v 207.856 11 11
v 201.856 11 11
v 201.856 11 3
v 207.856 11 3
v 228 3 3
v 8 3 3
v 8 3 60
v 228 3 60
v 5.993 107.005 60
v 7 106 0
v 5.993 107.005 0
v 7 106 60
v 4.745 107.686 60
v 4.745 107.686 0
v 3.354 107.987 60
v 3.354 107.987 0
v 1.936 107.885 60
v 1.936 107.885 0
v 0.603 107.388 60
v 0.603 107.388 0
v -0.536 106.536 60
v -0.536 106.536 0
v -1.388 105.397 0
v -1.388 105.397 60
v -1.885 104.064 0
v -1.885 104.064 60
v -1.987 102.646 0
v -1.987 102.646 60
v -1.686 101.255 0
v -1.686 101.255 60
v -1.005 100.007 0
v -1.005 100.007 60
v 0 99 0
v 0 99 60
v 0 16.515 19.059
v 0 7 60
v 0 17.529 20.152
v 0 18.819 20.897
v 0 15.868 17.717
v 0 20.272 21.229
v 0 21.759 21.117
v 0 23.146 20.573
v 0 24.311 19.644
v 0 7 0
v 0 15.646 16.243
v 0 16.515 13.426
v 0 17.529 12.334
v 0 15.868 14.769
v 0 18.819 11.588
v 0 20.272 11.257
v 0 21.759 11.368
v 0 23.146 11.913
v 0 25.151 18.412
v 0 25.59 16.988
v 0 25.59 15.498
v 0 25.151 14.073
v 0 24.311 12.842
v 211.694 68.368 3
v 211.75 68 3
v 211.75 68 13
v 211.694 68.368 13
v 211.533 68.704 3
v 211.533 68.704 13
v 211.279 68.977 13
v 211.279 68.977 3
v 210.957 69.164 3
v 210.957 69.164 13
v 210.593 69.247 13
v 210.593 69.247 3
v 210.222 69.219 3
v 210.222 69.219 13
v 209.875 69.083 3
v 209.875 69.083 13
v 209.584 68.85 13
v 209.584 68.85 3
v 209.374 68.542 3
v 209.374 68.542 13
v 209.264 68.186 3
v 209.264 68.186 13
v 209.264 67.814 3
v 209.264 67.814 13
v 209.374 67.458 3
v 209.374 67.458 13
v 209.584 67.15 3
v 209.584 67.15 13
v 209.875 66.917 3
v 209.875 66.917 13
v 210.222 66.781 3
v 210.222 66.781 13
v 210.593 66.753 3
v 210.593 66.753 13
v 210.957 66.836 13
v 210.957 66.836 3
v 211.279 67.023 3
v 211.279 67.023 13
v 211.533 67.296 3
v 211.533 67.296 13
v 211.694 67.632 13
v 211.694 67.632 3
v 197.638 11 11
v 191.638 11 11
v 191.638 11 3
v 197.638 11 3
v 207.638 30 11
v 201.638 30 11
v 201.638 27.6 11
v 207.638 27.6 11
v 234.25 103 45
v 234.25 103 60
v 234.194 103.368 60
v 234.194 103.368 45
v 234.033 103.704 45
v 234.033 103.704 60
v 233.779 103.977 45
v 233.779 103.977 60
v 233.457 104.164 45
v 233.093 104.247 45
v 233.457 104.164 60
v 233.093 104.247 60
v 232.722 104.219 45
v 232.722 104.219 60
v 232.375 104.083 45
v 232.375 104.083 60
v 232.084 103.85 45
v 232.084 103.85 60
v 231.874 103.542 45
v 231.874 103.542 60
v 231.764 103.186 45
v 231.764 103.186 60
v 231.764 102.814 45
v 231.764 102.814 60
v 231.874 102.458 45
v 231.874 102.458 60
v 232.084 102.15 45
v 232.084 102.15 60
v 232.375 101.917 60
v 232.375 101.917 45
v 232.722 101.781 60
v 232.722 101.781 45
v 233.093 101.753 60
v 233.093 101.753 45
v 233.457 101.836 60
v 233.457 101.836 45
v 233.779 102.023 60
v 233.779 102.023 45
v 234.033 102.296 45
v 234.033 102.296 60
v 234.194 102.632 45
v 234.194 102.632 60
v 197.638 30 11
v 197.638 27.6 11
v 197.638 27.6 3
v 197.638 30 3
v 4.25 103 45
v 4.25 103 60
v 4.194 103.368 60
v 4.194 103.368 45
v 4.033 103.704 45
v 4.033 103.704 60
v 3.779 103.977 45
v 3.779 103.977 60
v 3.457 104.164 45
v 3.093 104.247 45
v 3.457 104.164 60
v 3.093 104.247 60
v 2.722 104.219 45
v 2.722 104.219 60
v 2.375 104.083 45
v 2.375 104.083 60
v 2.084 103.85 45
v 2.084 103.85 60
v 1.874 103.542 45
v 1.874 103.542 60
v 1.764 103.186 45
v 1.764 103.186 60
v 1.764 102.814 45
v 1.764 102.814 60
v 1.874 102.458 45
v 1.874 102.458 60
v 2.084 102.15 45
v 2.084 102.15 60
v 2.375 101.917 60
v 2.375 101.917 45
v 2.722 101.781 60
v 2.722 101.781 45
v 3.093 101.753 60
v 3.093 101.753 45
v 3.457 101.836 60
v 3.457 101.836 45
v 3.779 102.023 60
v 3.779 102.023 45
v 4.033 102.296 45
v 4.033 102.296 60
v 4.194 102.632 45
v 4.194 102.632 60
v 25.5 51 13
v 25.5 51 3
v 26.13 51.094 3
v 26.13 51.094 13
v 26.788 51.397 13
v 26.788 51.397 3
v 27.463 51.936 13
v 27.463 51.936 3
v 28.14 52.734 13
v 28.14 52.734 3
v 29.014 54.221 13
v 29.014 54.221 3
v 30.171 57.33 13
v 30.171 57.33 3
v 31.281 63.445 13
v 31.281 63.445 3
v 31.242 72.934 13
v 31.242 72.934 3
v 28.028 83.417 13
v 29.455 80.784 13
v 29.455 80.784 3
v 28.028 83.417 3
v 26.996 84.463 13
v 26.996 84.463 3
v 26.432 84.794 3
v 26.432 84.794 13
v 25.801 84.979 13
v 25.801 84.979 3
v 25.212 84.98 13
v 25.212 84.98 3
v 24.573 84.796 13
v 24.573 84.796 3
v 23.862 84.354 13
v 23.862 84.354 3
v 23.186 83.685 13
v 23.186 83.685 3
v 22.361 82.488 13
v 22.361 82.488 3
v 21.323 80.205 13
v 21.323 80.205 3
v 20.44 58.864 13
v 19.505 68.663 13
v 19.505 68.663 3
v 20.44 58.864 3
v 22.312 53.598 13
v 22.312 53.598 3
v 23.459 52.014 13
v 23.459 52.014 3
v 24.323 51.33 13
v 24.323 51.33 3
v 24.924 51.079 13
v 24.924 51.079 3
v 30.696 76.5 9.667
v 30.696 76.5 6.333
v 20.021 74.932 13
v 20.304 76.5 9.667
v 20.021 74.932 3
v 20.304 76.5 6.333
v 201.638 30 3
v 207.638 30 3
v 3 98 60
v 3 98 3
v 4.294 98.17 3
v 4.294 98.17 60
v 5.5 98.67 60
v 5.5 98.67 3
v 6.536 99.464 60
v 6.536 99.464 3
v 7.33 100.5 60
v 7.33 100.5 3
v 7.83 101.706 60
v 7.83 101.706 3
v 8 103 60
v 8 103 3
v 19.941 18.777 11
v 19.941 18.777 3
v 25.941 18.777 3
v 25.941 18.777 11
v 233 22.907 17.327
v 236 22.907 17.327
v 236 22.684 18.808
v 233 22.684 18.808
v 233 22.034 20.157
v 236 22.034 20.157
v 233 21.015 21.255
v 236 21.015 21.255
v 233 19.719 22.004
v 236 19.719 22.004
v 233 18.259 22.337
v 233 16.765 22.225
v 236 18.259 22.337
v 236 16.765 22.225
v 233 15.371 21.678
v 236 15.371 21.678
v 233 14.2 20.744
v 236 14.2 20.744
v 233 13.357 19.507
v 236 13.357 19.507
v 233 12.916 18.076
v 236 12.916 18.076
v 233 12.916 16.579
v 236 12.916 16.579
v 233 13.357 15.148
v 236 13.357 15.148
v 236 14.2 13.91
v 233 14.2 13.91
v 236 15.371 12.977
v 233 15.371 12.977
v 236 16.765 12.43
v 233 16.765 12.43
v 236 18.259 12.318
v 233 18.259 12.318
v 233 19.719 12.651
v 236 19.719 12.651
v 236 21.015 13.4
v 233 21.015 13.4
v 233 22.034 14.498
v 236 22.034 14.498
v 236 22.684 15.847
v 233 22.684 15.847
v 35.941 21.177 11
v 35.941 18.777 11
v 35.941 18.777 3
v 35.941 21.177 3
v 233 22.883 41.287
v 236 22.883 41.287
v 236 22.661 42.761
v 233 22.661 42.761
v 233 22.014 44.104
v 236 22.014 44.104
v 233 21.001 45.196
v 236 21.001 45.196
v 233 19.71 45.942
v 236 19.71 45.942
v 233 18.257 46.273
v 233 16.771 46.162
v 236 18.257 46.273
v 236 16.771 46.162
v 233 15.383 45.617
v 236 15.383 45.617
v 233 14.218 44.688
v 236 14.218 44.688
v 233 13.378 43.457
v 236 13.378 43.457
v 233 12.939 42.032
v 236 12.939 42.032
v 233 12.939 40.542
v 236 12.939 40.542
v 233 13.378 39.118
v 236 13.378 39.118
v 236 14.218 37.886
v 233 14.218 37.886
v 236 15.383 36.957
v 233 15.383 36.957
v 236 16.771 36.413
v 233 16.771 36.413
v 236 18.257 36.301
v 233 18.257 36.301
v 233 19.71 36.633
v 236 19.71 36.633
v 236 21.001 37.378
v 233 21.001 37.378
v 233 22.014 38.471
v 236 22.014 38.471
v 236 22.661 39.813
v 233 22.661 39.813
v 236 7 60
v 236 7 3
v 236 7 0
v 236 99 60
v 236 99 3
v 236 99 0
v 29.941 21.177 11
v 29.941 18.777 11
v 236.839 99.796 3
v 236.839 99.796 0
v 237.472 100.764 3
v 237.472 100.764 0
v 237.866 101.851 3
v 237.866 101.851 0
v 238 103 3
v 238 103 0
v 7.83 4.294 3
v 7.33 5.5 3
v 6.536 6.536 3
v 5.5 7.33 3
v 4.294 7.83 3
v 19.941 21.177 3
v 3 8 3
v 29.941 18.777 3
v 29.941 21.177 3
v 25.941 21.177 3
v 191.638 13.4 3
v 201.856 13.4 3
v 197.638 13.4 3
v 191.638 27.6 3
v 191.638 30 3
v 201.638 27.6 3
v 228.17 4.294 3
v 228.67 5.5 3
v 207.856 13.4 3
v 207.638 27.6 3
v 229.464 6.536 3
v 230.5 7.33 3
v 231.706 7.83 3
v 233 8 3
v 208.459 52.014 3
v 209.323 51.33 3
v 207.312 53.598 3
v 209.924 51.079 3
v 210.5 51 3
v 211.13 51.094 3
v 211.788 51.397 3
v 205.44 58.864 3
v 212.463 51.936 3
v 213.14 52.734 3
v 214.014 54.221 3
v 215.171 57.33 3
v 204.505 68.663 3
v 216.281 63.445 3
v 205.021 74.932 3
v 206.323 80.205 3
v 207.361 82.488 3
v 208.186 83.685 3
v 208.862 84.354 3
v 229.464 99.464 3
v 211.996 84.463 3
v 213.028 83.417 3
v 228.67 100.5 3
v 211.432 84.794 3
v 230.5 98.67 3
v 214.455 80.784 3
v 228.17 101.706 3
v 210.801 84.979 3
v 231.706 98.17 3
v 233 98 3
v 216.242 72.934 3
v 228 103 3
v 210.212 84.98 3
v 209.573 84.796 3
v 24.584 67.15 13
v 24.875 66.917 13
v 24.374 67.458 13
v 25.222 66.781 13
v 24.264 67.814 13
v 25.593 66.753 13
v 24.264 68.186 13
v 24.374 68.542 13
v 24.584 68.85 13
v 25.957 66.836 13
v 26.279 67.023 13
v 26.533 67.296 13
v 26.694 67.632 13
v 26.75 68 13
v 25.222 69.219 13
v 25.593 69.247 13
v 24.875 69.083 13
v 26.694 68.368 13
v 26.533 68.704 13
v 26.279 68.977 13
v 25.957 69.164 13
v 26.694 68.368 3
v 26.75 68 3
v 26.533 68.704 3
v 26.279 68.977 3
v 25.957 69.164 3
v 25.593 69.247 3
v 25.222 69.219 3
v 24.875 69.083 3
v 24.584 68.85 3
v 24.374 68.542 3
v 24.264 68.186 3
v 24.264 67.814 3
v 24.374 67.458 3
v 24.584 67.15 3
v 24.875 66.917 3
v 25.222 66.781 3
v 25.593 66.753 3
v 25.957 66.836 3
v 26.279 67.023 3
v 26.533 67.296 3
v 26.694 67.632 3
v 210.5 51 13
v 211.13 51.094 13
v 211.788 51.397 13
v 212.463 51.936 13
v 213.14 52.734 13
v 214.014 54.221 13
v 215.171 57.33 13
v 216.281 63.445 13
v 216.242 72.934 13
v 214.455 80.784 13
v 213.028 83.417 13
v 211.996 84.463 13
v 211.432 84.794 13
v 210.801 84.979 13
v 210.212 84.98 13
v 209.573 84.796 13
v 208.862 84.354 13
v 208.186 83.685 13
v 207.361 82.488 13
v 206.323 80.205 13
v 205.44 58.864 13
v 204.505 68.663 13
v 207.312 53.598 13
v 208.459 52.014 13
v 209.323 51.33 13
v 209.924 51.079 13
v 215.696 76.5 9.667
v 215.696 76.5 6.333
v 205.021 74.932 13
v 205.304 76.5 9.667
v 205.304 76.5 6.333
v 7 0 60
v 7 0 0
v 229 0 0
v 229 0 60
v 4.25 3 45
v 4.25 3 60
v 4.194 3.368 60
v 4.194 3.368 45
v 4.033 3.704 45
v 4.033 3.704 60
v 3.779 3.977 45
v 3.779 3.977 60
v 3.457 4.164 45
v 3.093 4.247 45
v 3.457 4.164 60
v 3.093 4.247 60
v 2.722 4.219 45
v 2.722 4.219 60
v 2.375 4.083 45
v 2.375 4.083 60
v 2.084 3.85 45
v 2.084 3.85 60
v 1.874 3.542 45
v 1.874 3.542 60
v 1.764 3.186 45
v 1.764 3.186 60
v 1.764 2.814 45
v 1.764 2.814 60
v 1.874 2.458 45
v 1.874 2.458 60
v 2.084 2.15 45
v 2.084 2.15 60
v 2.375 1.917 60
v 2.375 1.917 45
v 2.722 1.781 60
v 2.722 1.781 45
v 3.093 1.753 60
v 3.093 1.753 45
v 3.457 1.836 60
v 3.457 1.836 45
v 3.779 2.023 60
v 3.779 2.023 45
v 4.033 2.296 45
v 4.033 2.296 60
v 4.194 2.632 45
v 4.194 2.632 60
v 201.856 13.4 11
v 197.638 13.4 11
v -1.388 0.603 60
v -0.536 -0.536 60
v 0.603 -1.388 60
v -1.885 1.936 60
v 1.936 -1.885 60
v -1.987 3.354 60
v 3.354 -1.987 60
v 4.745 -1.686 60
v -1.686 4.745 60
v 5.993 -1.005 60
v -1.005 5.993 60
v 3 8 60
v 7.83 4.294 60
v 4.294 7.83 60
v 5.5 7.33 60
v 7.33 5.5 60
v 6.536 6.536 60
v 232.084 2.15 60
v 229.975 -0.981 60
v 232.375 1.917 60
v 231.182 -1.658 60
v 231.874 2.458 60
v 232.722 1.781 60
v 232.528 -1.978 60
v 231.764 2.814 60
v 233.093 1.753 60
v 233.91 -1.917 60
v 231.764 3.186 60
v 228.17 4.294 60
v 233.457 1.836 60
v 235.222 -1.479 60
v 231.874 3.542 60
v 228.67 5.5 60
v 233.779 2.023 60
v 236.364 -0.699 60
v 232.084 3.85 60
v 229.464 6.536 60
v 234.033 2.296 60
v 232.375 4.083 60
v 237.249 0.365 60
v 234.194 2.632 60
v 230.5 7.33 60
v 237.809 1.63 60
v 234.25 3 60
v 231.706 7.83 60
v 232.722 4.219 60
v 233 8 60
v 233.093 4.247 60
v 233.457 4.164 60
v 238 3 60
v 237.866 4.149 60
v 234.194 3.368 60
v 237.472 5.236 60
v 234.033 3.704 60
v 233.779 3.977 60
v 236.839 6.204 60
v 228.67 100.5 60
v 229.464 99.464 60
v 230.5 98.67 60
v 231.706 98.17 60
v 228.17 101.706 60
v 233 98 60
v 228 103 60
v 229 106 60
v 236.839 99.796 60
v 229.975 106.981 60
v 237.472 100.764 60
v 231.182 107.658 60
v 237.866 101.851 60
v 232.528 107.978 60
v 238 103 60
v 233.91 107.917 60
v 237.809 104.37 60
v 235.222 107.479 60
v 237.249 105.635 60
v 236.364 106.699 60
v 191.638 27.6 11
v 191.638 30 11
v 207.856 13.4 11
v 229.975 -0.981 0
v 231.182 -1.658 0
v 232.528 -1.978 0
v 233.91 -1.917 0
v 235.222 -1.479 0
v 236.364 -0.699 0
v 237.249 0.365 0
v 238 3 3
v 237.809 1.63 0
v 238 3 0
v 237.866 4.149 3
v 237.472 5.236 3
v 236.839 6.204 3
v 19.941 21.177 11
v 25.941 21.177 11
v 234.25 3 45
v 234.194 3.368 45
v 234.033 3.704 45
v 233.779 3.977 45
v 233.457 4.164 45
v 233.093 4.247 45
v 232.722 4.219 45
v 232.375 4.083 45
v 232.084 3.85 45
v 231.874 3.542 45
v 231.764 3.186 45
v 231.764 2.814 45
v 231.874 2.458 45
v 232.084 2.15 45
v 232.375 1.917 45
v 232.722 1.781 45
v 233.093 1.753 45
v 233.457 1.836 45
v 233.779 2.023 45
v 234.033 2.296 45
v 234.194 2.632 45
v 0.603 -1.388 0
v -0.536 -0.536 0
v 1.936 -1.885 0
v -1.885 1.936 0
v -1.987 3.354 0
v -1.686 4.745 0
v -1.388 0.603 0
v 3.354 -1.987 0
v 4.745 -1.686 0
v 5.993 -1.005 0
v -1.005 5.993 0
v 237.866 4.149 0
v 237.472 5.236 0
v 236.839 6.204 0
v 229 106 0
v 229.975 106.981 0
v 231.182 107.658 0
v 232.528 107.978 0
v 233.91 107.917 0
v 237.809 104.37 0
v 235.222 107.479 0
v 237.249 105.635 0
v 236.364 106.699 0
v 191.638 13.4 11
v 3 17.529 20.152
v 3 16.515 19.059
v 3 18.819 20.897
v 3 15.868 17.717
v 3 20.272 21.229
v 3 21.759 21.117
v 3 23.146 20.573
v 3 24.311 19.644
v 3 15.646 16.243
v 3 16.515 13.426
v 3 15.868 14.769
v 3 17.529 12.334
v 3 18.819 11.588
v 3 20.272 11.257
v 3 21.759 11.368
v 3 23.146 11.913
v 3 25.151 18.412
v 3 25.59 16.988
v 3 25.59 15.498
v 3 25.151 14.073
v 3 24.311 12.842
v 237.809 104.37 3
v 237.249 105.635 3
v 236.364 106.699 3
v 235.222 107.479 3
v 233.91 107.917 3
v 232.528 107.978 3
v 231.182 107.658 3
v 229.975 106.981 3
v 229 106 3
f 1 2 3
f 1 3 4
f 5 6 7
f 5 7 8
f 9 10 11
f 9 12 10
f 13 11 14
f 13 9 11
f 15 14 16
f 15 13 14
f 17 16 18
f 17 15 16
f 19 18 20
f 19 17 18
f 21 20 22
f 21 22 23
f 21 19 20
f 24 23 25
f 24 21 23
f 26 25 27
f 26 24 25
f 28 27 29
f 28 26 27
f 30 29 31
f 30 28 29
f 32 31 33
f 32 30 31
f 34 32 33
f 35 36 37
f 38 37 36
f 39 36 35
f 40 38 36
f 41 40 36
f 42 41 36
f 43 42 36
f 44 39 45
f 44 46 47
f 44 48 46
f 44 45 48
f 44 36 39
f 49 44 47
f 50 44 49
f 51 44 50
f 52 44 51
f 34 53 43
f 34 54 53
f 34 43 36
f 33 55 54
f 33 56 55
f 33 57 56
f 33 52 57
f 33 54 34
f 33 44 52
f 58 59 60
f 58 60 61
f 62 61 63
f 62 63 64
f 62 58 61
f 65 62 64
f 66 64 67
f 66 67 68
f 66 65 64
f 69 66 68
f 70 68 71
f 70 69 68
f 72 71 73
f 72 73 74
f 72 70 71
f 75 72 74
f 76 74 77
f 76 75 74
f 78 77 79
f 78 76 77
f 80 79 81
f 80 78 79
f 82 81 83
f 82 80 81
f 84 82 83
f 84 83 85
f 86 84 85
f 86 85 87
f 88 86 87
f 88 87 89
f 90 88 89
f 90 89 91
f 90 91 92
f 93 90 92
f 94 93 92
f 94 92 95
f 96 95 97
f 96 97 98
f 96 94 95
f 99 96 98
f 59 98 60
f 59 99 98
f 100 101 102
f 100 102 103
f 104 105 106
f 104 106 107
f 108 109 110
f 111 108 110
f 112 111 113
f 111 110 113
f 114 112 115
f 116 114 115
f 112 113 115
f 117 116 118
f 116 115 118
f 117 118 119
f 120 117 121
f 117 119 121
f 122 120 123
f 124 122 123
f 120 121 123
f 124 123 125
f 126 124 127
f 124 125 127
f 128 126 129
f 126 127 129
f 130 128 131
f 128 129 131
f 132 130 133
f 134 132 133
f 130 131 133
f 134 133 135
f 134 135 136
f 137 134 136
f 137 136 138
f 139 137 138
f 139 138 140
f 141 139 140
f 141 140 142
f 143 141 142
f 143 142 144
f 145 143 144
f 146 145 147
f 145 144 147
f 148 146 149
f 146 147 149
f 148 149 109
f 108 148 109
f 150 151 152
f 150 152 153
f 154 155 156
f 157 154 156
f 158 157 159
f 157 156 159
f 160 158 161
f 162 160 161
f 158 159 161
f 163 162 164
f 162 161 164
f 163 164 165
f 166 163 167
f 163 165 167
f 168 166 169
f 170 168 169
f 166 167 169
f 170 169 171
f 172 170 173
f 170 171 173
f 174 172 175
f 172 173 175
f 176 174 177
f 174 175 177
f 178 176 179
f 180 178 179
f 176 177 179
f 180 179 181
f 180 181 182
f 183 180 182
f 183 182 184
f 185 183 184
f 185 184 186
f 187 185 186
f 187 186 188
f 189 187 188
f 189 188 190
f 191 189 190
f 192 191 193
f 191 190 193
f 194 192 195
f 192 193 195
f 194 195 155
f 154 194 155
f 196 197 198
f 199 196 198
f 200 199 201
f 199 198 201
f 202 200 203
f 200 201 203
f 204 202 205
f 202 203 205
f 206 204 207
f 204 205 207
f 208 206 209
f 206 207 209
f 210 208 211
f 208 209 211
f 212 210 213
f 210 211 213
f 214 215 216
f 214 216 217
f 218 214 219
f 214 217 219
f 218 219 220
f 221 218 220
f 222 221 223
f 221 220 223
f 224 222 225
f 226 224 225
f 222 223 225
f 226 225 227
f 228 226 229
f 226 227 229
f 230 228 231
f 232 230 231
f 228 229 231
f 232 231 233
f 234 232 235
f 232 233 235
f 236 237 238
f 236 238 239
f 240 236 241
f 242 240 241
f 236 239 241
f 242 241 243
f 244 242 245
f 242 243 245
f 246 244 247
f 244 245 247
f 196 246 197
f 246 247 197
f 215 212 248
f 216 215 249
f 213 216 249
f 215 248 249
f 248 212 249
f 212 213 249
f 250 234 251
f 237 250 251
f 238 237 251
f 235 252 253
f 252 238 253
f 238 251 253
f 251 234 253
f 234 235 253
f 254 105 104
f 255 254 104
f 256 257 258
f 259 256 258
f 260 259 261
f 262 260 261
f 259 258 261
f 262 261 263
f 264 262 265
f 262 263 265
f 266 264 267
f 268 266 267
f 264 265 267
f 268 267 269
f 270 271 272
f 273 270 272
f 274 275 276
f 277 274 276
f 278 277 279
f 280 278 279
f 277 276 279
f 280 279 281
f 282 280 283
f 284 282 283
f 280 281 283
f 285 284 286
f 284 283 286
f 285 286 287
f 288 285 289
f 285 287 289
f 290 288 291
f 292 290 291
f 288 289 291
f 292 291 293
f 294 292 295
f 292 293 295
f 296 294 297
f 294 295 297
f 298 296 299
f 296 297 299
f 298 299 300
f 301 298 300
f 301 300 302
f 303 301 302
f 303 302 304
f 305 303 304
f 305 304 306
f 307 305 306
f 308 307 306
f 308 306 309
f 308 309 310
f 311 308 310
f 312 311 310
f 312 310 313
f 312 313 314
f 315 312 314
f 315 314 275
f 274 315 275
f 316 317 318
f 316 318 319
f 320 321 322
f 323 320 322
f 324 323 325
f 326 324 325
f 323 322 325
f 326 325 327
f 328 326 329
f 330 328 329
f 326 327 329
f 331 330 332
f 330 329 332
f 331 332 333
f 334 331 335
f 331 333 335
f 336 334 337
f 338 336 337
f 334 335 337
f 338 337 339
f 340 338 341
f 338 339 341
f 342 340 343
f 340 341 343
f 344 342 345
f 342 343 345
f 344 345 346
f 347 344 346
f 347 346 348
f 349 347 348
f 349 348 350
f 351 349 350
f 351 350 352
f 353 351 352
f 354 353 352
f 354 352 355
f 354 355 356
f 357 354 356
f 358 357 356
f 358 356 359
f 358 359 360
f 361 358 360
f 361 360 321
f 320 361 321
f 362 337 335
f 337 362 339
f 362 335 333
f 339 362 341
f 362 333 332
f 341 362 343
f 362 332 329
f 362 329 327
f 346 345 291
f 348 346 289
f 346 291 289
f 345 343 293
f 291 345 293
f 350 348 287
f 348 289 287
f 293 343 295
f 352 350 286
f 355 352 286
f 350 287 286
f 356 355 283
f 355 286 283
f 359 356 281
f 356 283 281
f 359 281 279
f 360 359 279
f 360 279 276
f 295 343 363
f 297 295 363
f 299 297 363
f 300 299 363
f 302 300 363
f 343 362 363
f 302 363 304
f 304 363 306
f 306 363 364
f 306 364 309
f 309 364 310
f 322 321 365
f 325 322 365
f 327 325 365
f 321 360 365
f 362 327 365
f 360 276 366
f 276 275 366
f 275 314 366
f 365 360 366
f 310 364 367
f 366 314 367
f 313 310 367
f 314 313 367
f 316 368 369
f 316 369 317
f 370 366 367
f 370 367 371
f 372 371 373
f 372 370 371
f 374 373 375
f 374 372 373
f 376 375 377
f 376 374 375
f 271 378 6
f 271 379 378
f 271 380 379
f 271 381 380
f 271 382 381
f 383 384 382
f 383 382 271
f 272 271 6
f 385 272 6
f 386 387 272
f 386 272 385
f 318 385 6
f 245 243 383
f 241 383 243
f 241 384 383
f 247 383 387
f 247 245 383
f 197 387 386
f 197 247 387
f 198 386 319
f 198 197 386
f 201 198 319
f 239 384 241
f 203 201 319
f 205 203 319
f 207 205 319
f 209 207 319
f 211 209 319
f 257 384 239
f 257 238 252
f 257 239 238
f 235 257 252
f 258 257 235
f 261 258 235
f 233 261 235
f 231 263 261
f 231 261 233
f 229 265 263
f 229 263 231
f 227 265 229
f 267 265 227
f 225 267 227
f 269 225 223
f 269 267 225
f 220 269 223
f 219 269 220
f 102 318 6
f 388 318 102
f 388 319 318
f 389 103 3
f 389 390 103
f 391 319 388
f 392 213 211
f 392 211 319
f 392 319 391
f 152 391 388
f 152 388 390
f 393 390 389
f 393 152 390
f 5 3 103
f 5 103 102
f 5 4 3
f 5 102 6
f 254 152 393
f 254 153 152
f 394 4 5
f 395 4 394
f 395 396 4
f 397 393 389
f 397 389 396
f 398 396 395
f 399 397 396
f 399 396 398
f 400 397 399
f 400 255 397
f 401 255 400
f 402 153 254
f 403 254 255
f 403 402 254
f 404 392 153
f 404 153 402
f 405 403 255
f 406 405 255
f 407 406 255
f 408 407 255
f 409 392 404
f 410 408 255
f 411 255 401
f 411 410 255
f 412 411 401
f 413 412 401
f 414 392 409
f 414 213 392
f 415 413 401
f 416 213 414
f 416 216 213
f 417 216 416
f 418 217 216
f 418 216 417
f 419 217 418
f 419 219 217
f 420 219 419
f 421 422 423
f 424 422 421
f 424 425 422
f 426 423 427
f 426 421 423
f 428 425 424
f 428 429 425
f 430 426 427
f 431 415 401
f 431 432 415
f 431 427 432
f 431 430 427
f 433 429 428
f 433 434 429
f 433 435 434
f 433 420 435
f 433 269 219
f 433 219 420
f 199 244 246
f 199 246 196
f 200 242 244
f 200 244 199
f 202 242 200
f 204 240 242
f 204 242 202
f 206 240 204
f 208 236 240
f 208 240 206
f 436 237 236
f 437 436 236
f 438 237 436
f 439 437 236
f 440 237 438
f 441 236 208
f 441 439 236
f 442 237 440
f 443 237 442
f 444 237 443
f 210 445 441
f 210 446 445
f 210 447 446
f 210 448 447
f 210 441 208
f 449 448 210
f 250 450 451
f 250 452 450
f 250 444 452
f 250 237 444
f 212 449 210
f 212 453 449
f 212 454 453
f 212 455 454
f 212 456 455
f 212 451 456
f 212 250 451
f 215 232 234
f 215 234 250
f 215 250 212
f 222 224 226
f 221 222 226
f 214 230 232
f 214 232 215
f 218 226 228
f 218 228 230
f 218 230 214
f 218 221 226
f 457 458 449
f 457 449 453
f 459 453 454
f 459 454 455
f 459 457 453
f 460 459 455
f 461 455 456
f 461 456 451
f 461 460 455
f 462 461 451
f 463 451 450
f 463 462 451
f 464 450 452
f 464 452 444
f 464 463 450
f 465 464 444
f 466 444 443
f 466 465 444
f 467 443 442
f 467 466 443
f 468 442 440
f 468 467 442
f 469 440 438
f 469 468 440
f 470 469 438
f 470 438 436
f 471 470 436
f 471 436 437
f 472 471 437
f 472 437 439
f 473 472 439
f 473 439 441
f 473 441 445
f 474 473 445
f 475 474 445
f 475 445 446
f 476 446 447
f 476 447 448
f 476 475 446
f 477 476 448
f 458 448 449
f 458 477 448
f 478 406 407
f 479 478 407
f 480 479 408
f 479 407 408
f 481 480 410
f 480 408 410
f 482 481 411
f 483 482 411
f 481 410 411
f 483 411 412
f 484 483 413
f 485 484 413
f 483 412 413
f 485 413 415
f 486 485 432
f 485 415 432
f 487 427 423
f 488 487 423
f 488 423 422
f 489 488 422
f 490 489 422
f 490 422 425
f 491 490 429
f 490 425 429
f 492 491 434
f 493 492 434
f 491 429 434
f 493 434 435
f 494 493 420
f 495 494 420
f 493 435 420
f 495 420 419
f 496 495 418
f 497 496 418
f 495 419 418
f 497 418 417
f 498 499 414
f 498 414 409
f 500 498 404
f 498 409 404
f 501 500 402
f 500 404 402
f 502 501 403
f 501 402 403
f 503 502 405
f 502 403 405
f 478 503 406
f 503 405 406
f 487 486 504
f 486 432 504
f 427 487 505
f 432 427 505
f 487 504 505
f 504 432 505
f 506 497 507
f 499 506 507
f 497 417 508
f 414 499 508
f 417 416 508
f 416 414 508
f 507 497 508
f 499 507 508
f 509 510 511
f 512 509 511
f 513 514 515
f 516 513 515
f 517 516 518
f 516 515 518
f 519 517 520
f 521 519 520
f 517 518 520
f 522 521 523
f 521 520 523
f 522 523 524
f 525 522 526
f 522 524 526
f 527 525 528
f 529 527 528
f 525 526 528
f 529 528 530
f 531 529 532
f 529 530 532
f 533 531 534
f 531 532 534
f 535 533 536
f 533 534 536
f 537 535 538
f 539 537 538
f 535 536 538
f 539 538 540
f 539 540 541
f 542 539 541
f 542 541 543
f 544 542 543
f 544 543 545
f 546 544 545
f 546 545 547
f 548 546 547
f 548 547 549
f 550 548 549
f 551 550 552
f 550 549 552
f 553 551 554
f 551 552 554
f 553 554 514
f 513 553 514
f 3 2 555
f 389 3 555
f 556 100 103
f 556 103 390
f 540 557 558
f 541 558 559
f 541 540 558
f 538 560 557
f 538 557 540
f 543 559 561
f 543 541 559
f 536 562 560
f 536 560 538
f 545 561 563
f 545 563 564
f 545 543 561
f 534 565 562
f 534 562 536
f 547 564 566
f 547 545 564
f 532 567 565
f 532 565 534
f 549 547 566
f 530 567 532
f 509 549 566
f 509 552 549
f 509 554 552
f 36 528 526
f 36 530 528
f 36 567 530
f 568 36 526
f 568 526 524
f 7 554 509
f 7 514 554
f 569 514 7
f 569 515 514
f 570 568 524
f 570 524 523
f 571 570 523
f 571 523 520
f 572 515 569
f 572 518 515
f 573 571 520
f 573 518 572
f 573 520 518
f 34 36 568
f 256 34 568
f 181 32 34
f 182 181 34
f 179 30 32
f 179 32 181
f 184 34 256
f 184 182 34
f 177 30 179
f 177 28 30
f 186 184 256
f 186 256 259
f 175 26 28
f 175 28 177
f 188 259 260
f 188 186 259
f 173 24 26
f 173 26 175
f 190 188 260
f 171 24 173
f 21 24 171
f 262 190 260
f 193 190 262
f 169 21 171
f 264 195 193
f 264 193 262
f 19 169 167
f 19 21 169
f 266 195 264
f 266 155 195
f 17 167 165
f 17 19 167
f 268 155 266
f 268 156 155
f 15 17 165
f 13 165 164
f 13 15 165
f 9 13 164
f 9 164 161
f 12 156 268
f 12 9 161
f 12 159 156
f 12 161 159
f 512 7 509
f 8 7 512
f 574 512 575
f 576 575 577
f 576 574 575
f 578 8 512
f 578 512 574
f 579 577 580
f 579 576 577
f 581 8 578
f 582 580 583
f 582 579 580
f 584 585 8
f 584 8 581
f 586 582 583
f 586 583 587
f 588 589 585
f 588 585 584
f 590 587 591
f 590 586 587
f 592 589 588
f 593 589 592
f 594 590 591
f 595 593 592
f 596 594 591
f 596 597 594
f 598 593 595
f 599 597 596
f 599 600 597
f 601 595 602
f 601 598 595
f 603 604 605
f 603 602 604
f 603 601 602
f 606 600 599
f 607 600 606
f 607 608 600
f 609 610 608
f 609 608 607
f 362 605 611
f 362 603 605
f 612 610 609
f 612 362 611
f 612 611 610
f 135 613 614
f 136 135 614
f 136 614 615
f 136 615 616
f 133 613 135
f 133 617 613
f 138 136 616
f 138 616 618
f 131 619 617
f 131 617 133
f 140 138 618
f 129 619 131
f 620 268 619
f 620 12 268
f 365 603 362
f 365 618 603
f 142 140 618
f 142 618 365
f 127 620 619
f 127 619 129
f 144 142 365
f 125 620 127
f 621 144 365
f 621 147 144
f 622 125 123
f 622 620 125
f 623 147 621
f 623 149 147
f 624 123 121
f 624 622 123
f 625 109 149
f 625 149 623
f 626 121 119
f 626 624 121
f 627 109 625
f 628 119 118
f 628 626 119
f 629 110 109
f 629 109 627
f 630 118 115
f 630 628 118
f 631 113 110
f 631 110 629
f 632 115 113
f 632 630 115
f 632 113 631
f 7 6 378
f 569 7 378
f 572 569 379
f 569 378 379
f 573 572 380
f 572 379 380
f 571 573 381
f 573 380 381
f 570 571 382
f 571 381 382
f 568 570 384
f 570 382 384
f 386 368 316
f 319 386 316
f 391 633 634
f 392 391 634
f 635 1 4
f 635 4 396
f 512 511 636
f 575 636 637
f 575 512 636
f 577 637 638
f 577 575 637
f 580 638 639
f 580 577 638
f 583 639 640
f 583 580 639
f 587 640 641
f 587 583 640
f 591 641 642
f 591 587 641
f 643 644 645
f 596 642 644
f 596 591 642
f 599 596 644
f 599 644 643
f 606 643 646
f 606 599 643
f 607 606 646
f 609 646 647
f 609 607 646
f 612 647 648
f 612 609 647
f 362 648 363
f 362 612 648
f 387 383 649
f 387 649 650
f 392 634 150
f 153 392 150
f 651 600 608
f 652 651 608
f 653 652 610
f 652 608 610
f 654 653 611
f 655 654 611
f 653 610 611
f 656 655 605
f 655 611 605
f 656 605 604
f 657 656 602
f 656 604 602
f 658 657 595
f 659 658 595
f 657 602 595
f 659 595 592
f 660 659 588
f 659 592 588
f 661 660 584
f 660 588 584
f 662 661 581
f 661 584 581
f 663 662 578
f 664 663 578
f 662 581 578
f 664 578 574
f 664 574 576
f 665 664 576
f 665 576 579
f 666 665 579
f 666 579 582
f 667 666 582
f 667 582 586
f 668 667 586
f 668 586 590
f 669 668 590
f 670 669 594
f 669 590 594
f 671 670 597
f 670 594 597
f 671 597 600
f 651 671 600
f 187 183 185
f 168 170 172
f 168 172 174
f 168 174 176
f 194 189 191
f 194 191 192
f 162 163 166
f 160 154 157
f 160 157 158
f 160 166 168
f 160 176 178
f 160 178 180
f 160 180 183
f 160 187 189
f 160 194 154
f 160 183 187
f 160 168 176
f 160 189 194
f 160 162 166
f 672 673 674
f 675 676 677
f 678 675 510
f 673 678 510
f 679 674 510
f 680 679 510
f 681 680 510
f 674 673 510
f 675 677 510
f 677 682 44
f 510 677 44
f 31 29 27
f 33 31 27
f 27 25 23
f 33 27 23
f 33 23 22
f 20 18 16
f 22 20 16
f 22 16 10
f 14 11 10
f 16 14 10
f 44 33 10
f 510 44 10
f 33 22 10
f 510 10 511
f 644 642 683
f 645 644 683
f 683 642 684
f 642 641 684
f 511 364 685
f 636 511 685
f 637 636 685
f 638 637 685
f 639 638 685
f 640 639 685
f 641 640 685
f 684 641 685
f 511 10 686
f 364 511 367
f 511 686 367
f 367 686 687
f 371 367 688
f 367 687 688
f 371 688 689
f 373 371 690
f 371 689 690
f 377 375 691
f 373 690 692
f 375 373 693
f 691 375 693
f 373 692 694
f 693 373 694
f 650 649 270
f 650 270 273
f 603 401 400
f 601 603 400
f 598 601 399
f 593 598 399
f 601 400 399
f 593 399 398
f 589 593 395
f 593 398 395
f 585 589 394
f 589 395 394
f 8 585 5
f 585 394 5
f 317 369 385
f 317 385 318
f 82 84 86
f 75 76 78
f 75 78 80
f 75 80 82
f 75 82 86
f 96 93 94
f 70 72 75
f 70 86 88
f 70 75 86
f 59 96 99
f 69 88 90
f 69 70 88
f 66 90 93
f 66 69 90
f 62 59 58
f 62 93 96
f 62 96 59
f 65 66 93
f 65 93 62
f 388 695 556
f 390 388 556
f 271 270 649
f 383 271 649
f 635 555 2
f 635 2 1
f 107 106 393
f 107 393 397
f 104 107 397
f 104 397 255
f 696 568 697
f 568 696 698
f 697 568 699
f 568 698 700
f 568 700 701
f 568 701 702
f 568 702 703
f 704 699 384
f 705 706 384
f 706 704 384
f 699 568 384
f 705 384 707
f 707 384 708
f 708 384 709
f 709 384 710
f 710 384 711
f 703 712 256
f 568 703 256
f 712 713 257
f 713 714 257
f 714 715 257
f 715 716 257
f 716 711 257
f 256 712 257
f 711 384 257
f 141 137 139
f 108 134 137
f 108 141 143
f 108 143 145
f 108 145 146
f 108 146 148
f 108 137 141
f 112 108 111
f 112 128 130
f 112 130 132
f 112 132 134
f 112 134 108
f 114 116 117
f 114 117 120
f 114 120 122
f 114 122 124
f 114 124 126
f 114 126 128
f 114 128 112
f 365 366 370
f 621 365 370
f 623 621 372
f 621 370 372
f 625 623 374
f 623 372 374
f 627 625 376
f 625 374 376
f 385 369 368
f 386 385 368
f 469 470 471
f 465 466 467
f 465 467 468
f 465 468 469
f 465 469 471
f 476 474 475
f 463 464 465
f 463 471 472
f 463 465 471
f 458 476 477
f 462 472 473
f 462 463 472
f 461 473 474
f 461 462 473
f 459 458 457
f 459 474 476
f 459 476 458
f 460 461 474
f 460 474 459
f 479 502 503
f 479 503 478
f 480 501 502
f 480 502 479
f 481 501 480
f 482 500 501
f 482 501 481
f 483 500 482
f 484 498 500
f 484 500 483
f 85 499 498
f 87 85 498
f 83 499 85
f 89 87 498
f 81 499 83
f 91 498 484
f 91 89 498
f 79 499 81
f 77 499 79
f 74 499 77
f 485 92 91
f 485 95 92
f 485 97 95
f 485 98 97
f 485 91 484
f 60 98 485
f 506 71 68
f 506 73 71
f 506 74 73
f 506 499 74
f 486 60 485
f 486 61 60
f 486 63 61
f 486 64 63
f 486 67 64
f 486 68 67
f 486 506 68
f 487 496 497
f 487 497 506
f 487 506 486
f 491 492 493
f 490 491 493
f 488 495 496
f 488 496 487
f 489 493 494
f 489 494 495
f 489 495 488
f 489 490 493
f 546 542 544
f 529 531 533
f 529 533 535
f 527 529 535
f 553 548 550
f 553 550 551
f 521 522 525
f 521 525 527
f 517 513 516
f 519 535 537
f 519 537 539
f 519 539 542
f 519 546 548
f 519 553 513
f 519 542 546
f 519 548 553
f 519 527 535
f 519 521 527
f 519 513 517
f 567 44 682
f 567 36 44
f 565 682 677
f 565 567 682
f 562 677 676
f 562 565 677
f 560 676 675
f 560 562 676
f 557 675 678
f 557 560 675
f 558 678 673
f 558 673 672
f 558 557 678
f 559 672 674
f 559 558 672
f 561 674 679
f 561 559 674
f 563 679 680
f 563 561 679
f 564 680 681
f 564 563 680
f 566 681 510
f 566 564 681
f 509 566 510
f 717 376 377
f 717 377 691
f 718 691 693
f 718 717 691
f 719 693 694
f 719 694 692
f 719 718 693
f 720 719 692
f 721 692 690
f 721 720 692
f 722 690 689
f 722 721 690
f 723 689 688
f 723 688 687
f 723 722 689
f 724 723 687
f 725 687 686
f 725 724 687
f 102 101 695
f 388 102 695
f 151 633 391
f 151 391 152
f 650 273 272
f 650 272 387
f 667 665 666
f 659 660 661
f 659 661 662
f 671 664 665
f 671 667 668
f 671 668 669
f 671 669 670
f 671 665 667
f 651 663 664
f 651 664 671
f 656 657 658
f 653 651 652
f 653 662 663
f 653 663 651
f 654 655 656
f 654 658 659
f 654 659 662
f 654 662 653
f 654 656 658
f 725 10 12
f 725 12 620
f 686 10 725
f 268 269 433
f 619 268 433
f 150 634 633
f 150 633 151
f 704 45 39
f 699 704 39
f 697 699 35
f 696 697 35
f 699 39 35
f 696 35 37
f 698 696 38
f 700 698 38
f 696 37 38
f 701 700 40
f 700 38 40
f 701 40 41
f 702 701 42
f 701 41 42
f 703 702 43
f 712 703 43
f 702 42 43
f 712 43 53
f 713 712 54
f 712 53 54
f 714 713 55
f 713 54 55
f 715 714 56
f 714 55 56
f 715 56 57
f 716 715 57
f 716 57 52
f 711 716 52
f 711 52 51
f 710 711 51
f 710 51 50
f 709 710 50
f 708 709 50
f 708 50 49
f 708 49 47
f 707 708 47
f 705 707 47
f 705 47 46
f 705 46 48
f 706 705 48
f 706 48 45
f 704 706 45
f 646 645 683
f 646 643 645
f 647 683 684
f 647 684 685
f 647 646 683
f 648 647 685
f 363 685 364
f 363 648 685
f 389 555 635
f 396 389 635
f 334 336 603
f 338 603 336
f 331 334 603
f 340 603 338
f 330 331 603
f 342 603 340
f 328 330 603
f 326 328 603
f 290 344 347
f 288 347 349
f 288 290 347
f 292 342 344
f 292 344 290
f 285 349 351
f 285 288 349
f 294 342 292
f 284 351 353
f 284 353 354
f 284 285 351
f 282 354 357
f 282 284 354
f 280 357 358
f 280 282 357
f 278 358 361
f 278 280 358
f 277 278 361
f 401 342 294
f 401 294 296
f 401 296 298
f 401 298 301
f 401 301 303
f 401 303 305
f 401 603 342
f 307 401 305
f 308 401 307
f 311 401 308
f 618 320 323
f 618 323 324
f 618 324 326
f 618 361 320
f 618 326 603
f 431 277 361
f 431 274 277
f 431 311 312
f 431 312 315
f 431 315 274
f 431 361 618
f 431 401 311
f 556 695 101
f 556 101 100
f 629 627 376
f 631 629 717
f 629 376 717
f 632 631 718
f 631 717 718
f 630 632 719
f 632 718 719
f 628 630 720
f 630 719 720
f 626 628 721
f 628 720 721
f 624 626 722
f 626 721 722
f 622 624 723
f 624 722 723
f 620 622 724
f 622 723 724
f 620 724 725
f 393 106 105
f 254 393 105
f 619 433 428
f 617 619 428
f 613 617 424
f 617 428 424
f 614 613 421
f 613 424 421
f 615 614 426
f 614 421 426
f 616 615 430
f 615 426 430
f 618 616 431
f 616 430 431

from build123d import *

# Parameters (mm, degrees)
F0_W      = 236
F0_H      = 106
F1_DEPTH  = 60
F2_T      = -3
F3_R      = 1.25
F4_DEPTH  = 10
F5_R      = 5
F7_DEPTH  = 57
F8_R      = 1.25
F9_DEPTH  = 15
F10_R     = 5.0237142935
F10_R_2   = 5
F11_DEPTH = 5
F12_R     = 5
F13_DEPTH = 5
F14_W     = 6
F14_H     = 2.4
F15_DEPTH = 11
F16_W     = 6
F16_H     = 2.4
F17_DEPTH = 11
F18_DEPTH = 3


with BuildPart() as f1:
    # F0 (on Top) → F1 (new body)
    with BuildSketch(Plane.XY):
        with Locations((118, 53)):
            Rectangle(F0_W, F0_H)
    extrude(amount=F1_DEPTH)

    # F2
    f2_openings = [f1.faces().sort_by_distance(p)[0] for p in [
        (118, 53, 60),
    ]]
    offset(amount=F2_T, openings=f2_openings)

    # F3 (on face) → F4 (join)
    with BuildSketch(Plane.XY.offset(3)):
        with BuildLine():
            add(Edge.make_bspline(
                [(25.5, 51), (35.8923048454, 51), (30.6961524227, 76.5), (25.5, 102), (20.3038475773, 76.5), (15.1076951546, 51), (25.5, 51)],
                knots=[0, 0, 0, 2.0943951024, 2.0943951024, 4.1887902048, 4.1887902048, 6.2831853072, 6.2831853072, 6.2831853072], degree=2, weights=[1, 0.5, 1, 0.5, 1, 0.5, 1]))
        make_face()
        with Locations((25.5, 68)):
            Circle(F3_R, mode=Mode.SUBTRACT)
        with BuildLine():
            add(Edge.make_bspline(
                [(210.5, 51), (220.8923048454, 51), (215.6961524227, 76.5), (210.5, 102), (205.3038475773, 76.5), (200.1076951546, 51), (210.5, 51)],
                knots=[0, 0, 0, 2.0943951024, 2.0943951024, 4.1887902048, 4.1887902048, 6.2831853072, 6.2831853072, 6.2831853072], degree=2, weights=[1, 0.5, 1, 0.5, 1, 0.5, 1]))
        make_face()
        with Locations((210.5, 68)):
            Circle(F3_R, mode=Mode.SUBTRACT)
    extrude(amount=F4_DEPTH)

    # F5
    f5_edges = [f1.edges().sort_by_distance(p)[0] for p in [
        (0, 0, 30),
        (0, 106, 30),
        (236, 0, 30),
        (236, 106, 30),
    ]]
    fillet(f5_edges, radius=F5_R)

    # F3 (on face) → F7 (join)
    with BuildSketch(Plane.XY.offset(3)):
        with BuildLine():
            ThreePointArc((3, 98), (6.5355339059, 99.4644660941), (8, 103))
            Line((8, 103), (3, 103))
            Line((3, 103), (3, 98))
        make_face()
        with BuildLine():
            ThreePointArc((8, 3), (6.5355339059, 6.5355339059), (3, 8))
            Line((3, 8), (3, 3))
            Line((3, 3), (8, 3))
        make_face()
        with BuildLine():
            Line((233, 103), (228, 103))
            ThreePointArc((228, 103), (229.4644660941, 99.4644660941), (233, 98))
            Line((233, 98), (233, 103))
        make_face()
        with BuildLine():
            Line((233, 3), (233, 8))
            ThreePointArc((233, 8), (229.4644660941, 6.5355339059), (228, 3))
            Line((228, 3), (233, 3))
        make_face()
        with BuildLine():
            ThreePointArc((238, 3), (236.5355339059, 6.5355339059), (233, 8))
            Line((233, 8), (233, 3))
            Line((233, 3), (228, 3))
            ThreePointArc((228, 3), (233, -2), (238, 3))
        make_face()
        with BuildLine():
            Line((3, 3), (3, 8))
            ThreePointArc((3, 8), (-0.5355339059, -0.5355339059), (8, 3))
            Line((8, 3), (3, 3))
        make_face()
        with BuildLine():
            Line((3, 103), (8, 103))
            ThreePointArc((8, 103), (-0.5355339059, 106.5355339059), (3, 98))
            Line((3, 98), (3, 103))
        make_face()
        with BuildLine():
            ThreePointArc((238, 103), (233, 108), (228, 103))
            Line((228, 103), (233, 103))
            Line((233, 103), (233, 98))
            ThreePointArc((233, 98), (236.5355339059, 99.4644660941), (238, 103))
        make_face()
    extrude(amount=F7_DEPTH)

    # F8 (on face) → F9 (cut)
    with BuildSketch(Plane.XY.offset(60)):
        with Locations((233, 3)):
            Circle(F8_R)
        with Locations((233, 103)):
            Circle(F8_R)
        with Locations((3, 3)):
            Circle(F8_R)
        with Locations((3, 103)):
            Circle(F8_R)
    extrude(amount=-F9_DEPTH, mode=Mode.SUBTRACT)

    # F10 (on face) → F11 (cut)
    with BuildSketch(Plane.YZ.offset(236)):
        with Locations((17.8831405938, 17.327476253)):
            Circle(F10_R)
        with Locations((17.8831405938, 41.2872235535)):
            Circle(F10_R_2)
    extrude(amount=-F11_DEPTH, mode=Mode.SUBTRACT)

    # F12 (on face) → F13 (cut)
    with BuildSketch(Plane(origin=(0, 0, 0), x_dir=(0, -1, 0), z_dir=(-1, 0, 0))):
        with Locations((-20.6461492926, 16.2427779287)):
            Circle(F12_R)
    extrude(amount=-F13_DEPTH, mode=Mode.SUBTRACT)

    # F14 (on face) → F15 (join)
    with BuildSketch(Plane.XY):
        with Locations((22.9410991961, 19.9766826301)):
            Rectangle(F14_W, F14_H)
        with Locations((32.9410991961, 19.9766826301)):
            Rectangle(F14_W, F14_H)
    extrude(amount=F15_DEPTH)

    # F16 (on face) → F17 (join)
    with BuildSketch(Plane.XY):
        with Locations((194.6382454364, 28.8)):
            Rectangle(F16_W, F16_H)
        with Locations((204.6382454364, 28.8)):
            Rectangle(F16_W, F16_H)
        with Locations((194.6382454364, 12.2)):
            Rectangle(F16_W, F16_H)
        with Locations((204.8560320139, 12.2)):
            Rectangle(F16_W, F16_H)
    extrude(amount=F17_DEPTH)

    # F18 (add): faces of the model
    f18_faces = [f1.faces().sort_by_distance(p)[0] for p in [
        (1.1261179487, 1.1261179487, 3),
        (1.1261179487, 104.8738820513, 3),
        (234.8738820513, 104.8738820513, 3),
        (234.8738820513, 1.1261179487, 3),
    ]]
    extrude(f18_faces, amount=F18_DEPTH)


solid = f1.part
